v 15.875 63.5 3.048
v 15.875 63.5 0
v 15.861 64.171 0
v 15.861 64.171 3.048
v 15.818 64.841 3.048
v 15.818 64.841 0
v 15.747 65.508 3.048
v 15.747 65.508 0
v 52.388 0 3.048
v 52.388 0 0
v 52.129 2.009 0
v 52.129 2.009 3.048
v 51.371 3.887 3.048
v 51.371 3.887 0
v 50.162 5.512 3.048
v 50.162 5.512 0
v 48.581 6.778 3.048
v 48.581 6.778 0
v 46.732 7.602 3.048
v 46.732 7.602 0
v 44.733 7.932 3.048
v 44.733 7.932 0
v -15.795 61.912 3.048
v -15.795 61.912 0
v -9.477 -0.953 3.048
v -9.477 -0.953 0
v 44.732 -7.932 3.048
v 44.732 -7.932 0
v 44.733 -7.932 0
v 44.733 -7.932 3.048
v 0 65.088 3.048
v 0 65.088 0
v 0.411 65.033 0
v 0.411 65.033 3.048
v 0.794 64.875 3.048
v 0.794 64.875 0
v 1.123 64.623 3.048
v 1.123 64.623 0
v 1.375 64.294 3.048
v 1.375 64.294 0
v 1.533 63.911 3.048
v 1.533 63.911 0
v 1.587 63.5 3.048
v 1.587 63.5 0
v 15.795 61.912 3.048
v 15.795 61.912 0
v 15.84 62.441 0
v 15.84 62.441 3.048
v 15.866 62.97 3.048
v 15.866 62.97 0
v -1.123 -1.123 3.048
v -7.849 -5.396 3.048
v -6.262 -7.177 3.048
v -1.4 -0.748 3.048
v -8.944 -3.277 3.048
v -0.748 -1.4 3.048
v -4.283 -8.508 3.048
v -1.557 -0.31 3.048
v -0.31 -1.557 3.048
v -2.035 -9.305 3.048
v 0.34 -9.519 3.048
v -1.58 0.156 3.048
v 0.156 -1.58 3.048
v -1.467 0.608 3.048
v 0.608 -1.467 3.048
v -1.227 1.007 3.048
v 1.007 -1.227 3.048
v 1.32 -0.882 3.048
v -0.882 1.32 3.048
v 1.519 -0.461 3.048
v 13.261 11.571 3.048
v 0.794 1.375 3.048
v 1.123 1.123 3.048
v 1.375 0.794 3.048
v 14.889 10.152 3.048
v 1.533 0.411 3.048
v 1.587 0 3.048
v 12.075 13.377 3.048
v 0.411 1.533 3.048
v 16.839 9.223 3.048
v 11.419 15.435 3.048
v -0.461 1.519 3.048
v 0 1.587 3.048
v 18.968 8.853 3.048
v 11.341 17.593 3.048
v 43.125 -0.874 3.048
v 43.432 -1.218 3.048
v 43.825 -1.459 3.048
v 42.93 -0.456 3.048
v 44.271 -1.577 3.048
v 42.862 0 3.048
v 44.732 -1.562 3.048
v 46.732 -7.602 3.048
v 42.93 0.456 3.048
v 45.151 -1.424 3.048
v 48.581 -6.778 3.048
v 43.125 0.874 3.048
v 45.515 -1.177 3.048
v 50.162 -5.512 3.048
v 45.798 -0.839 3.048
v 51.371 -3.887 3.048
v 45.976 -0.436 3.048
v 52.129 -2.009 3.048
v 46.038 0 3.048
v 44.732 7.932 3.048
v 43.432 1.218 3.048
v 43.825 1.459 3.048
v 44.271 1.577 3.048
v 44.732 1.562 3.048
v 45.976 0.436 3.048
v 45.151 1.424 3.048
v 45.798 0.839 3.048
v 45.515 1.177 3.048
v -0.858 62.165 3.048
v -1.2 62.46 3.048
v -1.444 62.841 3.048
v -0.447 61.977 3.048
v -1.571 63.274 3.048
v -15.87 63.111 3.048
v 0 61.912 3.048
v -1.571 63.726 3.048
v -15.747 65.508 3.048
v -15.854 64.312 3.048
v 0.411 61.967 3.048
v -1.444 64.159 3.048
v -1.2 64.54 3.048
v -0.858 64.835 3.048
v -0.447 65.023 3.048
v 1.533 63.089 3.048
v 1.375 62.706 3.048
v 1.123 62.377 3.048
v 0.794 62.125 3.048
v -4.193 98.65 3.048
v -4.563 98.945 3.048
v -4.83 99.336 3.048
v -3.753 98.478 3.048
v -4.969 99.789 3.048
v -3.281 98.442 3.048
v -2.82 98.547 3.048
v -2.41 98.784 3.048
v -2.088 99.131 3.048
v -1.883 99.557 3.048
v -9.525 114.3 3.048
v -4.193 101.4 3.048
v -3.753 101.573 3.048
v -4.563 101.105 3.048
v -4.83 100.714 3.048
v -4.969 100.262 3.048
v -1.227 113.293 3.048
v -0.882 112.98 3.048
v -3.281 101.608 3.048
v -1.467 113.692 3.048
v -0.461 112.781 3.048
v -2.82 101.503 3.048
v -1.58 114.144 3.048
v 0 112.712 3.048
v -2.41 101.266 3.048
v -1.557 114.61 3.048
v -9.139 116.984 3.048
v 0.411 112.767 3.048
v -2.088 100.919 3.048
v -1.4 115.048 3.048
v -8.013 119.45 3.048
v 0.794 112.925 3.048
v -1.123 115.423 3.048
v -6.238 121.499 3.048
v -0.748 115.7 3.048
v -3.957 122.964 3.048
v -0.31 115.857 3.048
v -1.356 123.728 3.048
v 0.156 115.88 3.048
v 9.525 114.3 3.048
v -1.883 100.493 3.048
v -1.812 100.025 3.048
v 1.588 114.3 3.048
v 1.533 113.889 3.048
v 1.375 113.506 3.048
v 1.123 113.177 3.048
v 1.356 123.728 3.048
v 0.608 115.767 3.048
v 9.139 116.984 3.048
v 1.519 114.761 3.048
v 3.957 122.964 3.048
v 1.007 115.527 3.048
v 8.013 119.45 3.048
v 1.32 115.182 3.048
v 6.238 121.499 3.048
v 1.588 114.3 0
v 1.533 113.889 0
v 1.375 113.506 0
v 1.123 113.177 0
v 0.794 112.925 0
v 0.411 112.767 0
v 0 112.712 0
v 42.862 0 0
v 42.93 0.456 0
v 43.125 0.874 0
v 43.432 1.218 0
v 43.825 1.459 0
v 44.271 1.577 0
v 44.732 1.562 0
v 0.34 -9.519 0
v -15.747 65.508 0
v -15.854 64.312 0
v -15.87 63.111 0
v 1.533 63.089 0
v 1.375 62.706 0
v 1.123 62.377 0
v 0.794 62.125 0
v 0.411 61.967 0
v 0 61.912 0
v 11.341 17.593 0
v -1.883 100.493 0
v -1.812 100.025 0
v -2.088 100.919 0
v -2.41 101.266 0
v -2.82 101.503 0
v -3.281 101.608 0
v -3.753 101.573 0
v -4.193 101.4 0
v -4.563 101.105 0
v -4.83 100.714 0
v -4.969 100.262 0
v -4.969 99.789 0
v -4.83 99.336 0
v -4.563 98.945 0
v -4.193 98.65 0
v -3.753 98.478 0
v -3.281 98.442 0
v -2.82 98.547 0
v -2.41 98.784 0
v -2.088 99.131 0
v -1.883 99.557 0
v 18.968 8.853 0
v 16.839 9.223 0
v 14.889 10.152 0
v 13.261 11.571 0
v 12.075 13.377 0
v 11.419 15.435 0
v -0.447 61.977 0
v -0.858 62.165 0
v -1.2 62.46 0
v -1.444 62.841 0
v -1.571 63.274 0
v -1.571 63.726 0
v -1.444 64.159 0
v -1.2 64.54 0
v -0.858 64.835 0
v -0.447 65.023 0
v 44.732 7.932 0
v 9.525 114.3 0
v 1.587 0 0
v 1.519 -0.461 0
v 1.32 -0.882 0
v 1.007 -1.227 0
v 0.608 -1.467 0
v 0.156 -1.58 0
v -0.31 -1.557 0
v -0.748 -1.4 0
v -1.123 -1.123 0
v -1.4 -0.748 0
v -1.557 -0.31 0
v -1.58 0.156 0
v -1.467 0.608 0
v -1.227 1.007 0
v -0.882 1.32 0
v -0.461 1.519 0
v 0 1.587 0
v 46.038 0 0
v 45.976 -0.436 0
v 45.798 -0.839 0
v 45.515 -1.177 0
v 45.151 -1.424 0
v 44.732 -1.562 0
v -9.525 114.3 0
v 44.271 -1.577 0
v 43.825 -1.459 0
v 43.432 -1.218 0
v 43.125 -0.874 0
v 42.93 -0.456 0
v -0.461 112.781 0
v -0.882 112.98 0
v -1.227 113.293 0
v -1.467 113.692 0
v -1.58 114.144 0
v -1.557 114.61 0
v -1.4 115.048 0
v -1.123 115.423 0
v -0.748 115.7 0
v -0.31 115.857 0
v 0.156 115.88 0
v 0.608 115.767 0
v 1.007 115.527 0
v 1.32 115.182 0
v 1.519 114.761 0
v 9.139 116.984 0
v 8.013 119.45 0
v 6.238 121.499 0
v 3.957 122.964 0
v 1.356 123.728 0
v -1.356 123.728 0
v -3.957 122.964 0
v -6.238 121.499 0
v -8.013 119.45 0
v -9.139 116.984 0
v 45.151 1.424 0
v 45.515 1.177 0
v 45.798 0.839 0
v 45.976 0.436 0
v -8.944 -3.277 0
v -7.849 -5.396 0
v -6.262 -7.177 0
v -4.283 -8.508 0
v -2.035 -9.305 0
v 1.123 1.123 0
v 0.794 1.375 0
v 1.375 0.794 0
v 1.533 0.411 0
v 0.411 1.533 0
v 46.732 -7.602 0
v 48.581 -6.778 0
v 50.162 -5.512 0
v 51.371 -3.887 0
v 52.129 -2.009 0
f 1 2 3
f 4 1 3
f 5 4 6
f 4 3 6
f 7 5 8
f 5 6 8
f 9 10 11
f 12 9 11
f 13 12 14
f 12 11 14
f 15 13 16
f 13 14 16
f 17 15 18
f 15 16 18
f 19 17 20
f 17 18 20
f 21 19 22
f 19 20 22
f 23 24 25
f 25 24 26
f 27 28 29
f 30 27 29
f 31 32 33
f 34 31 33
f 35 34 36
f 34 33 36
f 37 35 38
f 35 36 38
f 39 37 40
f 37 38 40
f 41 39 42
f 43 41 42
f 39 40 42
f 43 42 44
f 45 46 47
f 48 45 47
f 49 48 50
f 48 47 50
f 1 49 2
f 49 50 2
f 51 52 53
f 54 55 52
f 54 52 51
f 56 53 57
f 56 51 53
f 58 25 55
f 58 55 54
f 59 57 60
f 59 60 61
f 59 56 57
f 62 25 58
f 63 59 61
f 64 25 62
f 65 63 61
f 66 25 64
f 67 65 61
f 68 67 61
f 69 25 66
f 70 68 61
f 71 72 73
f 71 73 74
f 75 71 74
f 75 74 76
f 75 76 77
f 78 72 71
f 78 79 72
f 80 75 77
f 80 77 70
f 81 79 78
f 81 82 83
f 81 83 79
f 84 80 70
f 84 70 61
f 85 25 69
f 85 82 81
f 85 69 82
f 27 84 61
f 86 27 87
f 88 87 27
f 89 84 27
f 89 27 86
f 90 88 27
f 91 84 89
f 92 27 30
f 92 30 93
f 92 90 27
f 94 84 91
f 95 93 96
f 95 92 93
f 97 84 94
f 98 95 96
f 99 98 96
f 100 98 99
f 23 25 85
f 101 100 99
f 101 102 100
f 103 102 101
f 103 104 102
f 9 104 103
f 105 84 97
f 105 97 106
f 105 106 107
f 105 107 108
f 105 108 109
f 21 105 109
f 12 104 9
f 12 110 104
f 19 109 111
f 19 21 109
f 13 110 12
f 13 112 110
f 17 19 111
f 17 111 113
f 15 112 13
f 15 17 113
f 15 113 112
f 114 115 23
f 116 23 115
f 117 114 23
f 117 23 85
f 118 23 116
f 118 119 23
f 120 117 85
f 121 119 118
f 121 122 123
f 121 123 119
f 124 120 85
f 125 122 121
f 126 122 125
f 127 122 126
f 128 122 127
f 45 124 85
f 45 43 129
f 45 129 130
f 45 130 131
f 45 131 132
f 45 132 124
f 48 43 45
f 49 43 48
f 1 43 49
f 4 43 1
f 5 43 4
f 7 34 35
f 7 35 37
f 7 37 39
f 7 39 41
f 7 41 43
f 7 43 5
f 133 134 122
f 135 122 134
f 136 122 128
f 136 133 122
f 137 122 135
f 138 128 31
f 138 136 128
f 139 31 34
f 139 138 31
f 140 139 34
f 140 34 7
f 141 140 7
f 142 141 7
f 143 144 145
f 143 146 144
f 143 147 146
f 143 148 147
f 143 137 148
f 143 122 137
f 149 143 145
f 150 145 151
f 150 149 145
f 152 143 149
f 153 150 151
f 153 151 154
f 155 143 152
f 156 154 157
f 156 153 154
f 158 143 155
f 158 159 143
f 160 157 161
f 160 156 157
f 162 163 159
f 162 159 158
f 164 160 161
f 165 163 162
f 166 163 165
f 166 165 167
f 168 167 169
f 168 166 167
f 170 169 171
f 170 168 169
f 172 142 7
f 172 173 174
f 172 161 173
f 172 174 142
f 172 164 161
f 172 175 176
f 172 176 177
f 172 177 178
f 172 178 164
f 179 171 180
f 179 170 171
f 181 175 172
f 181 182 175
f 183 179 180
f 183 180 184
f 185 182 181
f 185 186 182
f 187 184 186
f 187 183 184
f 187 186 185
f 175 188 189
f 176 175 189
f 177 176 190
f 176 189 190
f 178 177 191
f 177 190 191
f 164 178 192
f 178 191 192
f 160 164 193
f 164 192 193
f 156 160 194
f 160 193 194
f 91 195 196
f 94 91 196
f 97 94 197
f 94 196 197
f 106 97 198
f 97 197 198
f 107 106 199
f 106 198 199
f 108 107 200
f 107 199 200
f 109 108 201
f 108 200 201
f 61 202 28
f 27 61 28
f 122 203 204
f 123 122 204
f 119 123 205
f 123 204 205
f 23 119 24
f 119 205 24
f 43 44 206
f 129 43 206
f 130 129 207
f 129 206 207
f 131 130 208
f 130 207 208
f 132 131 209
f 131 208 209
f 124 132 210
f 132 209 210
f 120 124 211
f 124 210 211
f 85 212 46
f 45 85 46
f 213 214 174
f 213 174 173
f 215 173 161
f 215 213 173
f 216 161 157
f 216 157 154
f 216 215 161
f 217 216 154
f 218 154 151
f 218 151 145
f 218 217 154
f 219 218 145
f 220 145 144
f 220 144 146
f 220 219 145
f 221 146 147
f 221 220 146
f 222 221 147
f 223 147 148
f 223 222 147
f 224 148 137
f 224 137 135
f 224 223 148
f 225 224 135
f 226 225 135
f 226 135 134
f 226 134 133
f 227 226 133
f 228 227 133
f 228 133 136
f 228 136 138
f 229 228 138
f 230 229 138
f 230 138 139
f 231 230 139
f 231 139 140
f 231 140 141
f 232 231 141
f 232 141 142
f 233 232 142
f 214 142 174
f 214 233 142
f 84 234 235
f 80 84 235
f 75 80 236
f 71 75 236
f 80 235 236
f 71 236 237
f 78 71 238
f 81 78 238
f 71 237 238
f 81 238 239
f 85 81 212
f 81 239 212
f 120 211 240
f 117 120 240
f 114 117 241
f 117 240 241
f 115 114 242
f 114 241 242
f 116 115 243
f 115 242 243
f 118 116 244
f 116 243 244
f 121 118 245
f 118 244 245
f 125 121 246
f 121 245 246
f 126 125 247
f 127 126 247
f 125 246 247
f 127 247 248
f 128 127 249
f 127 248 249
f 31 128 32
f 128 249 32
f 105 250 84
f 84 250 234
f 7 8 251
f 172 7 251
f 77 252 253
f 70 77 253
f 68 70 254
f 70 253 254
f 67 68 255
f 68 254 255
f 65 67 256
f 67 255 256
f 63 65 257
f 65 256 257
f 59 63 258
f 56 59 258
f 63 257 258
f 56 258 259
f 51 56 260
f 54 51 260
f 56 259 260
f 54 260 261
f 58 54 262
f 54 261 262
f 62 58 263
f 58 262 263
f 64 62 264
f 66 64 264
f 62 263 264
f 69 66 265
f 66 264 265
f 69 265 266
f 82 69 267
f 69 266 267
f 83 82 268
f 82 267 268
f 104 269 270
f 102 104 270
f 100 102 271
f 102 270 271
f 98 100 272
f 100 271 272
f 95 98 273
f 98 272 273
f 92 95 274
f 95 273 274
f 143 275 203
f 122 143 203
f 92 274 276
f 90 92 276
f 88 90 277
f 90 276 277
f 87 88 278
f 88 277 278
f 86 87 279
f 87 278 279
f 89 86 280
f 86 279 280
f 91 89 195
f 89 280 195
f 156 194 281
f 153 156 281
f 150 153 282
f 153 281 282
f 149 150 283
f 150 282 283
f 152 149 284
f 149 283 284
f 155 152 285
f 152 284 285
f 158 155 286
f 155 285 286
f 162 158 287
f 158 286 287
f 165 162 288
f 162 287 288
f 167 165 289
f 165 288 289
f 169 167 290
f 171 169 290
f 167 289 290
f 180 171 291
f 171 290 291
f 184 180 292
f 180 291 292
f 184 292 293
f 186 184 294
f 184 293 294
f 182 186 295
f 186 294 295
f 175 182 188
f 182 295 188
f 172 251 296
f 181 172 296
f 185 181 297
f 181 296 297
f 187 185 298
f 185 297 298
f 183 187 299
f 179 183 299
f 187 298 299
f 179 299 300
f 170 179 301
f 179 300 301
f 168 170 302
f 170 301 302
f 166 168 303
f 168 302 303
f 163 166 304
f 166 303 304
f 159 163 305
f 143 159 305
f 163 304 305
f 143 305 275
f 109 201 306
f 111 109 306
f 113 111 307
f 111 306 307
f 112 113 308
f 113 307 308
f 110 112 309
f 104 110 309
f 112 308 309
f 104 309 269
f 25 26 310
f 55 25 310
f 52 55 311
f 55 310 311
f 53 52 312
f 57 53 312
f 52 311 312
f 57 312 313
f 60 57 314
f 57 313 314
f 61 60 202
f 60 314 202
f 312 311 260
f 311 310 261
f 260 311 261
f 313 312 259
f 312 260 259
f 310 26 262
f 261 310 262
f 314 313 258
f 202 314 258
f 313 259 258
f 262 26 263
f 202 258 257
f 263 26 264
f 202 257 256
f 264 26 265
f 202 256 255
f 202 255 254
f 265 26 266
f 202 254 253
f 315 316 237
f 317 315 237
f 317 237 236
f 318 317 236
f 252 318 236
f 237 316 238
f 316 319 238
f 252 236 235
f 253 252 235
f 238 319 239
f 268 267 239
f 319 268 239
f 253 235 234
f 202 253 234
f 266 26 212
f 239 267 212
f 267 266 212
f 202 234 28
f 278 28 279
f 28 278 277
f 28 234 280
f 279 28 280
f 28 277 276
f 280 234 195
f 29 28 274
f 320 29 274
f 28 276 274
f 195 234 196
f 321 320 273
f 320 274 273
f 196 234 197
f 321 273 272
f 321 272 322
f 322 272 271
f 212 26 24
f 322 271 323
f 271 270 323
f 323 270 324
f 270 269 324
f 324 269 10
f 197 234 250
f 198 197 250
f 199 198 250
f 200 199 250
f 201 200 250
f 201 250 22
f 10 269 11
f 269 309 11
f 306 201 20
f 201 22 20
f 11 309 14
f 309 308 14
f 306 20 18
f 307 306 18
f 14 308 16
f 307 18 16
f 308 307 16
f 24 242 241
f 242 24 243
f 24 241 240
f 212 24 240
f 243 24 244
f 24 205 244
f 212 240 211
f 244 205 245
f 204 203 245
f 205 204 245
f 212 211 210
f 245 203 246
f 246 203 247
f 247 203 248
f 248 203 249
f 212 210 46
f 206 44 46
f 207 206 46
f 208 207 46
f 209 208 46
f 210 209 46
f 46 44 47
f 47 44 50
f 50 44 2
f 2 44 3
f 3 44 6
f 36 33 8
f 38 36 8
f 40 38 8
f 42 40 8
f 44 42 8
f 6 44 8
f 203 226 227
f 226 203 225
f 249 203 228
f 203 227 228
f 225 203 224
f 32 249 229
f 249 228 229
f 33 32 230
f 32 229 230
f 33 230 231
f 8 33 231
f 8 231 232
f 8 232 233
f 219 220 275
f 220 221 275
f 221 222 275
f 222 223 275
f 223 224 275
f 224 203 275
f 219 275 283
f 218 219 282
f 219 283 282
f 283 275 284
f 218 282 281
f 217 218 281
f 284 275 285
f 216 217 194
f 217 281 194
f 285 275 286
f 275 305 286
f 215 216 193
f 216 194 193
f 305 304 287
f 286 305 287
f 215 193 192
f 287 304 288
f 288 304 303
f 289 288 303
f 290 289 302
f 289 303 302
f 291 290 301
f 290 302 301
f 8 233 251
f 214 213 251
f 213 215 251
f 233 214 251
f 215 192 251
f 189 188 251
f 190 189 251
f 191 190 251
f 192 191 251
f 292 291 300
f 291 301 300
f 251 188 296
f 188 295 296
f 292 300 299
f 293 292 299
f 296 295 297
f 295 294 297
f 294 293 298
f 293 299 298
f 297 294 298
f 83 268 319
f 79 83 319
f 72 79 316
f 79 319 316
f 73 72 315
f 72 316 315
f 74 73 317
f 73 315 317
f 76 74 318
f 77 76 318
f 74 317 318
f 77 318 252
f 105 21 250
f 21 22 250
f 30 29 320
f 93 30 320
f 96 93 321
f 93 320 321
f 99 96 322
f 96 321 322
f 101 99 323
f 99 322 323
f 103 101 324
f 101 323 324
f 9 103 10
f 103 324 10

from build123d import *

# Parameters (mm, degrees)
F0_R     = 1.5875
F1_DEPTH = 3.048


with BuildPart() as f1:
    # F0 (on Top) → F1 (new body)
    with BuildSketch(Plane.XY):
        with BuildLine():
            ThreePointArc((1.5875, 0), (-1.1225320151, -1.1225320151), (0, 1.5875))
            Line((0, 1.5875), (0, 9.525))
            ThreePointArc((0, 9.525), (-7.063929059, 6.3895642457), (-9.4772553384, -0.9525))
            ThreePointArc((-9.4772553384, -0.9525), (-6.2623833816, -7.1769199091), (0.3401785714, -9.5189234444))
            ThreePointArc((0.3401785714, -9.5189234444), (6.8544082857, -6.6138273378), (9.525, 0))
            Line((9.525, 0), (1.5875, 0))
        make_face()
        with BuildLine():
            ThreePointArc((-9.4772553384, -0.9525), (-7.063929059, 6.3895642457), (0, 9.525))
            Line((0, 9.525), (0, 47.625))
            ThreePointArc((0, 47.625), (-10.6492737428, 51.7267849017), (-15.7954255641, 61.9125))
            Line((-15.7954255641, 61.9125), (-9.4772553384, -0.9525))
        make_face()
        with BuildLine():
            Line((0, 47.625), (0, 9.525))
            ThreePointArc((0, 9.525), (6.7351920908, 6.7351920908), (9.525, 0))
            Line((9.525, 0), (36.5125, 0))
            ThreePointArc((36.5125, 0), (38.9380895153, 5.7116327839), (44.7324052746, 7.9324746146))
            Line((44.7324052772, 7.9324746877), (18.9676000005, 8.8532337108))
            ThreePointArc((18.9676000005, 8.8532337108), (13.2611998974, 11.5713591498), (11.3411865923, 17.5933818124))
            Line((11.3411865923, 17.5933818124), (15.7954255641, 61.9125))
            ThreePointArc((15.7954255641, 61.9125), (10.6492737428, 51.7267849017), (0, 47.625))
        make_face()
        with BuildLine():
            Line((36.5125, 0), (9.525, 0))
            ThreePointArc((9.525, 0), (6.8544082857, -6.6138273378), (0.3401785714, -9.5189234444))
            Line((0.3401785714, -9.5189234444), (44.7324052772, -7.9324746877))
            ThreePointArc((44.7324052746, -7.9324746146), (38.9380895153, -5.7116327839), (36.5125, 0))
        make_face()
        with BuildLine():
            ThreePointArc((-15.7954255641, 61.9125), (-10.6492737428, 51.7267849017), (0, 47.625))
            Line((0, 47.625), (0, 61.9125))
            ThreePointArc((0, 61.9125), (-1.5875, 63.5), (0, 65.0875))
            Line((0, 65.0875), (0, 79.375))
            ThreePointArc((0, 79.375), (-10.4912828548, 75.4142187767), (-15.7474569047, 65.5082893304))
            ThreePointArc((-15.7474569047, 65.5082893304), (-15.8735876171, 63.7117573215), (-15.7954255641, 61.9125))
        make_face()
        with BuildLine():
            Line((0, 61.9125), (0, 47.625))
            ThreePointArc((0, 47.625), (10.6492737428, 51.7267849017), (15.7954255641, 61.9125))
            ThreePointArc((15.7954255641, 61.9125), (15.8550939106, 62.7052534459), (15.875, 63.5))
            ThreePointArc((15.875, 63.5), (15.8430821396, 64.5061676396), (15.7474569047, 65.5082893304))
            ThreePointArc((15.7474569047, 65.5082893304), (10.4912828548, 75.4142187767), (0, 79.375))
            Line((0, 79.375), (0, 65.0875))
            ThreePointArc((0, 65.0875), (1.1225320151, 64.6225320151), (1.5875, 63.5))
            ThreePointArc((1.5875, 63.5), (1.1225320151, 62.3774679849), (0, 61.9125))
        make_face()
        with BuildLine():
            ThreePointArc((44.7324052746, 7.9324746146), (38.9380895153, 5.7116327839), (36.5125, 0))
            Line((36.5125, 0), (42.8625, 0))
            ThreePointArc((42.8625, 0), (43.4321989692, 1.2182927857), (44.7324052746, 1.5621790905))
            Line((44.7324052746, 1.5621790905), (44.7324052746, 7.9324746146))
        make_face()
        with BuildLine():
            Line((42.8625, 0), (36.5125, 0))
            ThreePointArc((36.5125, 0), (38.9380895153, -5.7116327839), (44.7324052746, -7.9324746146))
            Line((44.7324052746, -7.9324746146), (44.7324052746, -1.5621790905))
            ThreePointArc((44.7324052746, -1.5621790905), (43.4321989692, -1.2182927857), (42.8625, 0))
        make_face()
        with BuildLine():
            ThreePointArc((44.7334821429, 7.9324362036), (44.7329437094, 7.9324554274), (44.7324052746, 7.9324746146))
            Line((44.7324052746, 7.9324746146), (44.7324052746, 1.5621790905))
            ThreePointArc((44.7324052746, 1.5621790905), (45.6682927857, 1.0178010308), (46.0375, 0))
            ThreePointArc((46.0375, 0), (45.6682927857, -1.0178010308), (44.7324052746, -1.5621790905))
            Line((44.7324052746, -1.5621790905), (44.7324052746, -7.9324746146))
            ThreePointArc((44.7324052746, -7.9324746146), (44.7329437094, -7.9324554274), (44.7334821429, -7.9324362036))
            ThreePointArc((44.7334821429, -7.9324362036), (50.1620069047, -5.5115227815), (52.3875, 0))
            ThreePointArc((52.3875, 0), (50.1620069047, 5.5115227815), (44.7334821429, 7.9324362036))
        make_face()
        with BuildLine():
            Line((-9.525, 114.3), (-15.7474569047, 65.5082893304))
            ThreePointArc((-15.7474569047, 65.5082893304), (-10.4912828548, 75.4142187767), (0, 79.375))
            Line((0, 79.375), (0, 104.775))
            ThreePointArc((0, 104.775), (-6.7351920908, 107.5648079092), (-9.525, 114.3))
        make_face()
        with Locations((-3.39970598, 100.0252)):
            Circle(F0_R, mode=Mode.SUBTRACT)
        with BuildLine():
            Line((0, 104.775), (0, 79.375))
            ThreePointArc((0, 79.375), (10.4912828548, 75.4142187767), (15.7474569047, 65.5082893304))
            Line((15.7474569047, 65.5082893304), (9.525, 114.3))
            ThreePointArc((9.525, 114.3), (6.7351920908, 107.5648079092), (0, 104.775))
        make_face()
        with BuildLine():
            ThreePointArc((9.525, 114.3), (0, 123.825), (-9.525, 114.3))
            ThreePointArc((-9.525, 114.3), (-6.7351920908, 107.5648079092), (0, 104.775))
            ThreePointArc((0, 104.775), (6.7351920908, 107.5648079092), (9.525, 114.3))
        make_face()
        with BuildLine():
            ThreePointArc((1.5875, 114.3), (1.1225320151, 113.1774679849), (0, 112.7125))
            ThreePointArc((0, 112.7125), (-1.1225320151, 115.4225320151), (1.5875, 114.3))
        make_face(mode=Mode.SUBTRACT)
        with BuildLine():
            Line((0, 9.525), (0, 1.5875))
            ThreePointArc((0, 1.5875), (1.1225320151, 1.1225320151), (1.5875, 0))
            Line((1.5875, 0), (9.525, 0))
            ThreePointArc((9.525, 0), (6.7351920908, 6.7351920908), (0, 9.525))
        make_face()
    extrude(amount=F1_DEPTH)


solid = f1.part
